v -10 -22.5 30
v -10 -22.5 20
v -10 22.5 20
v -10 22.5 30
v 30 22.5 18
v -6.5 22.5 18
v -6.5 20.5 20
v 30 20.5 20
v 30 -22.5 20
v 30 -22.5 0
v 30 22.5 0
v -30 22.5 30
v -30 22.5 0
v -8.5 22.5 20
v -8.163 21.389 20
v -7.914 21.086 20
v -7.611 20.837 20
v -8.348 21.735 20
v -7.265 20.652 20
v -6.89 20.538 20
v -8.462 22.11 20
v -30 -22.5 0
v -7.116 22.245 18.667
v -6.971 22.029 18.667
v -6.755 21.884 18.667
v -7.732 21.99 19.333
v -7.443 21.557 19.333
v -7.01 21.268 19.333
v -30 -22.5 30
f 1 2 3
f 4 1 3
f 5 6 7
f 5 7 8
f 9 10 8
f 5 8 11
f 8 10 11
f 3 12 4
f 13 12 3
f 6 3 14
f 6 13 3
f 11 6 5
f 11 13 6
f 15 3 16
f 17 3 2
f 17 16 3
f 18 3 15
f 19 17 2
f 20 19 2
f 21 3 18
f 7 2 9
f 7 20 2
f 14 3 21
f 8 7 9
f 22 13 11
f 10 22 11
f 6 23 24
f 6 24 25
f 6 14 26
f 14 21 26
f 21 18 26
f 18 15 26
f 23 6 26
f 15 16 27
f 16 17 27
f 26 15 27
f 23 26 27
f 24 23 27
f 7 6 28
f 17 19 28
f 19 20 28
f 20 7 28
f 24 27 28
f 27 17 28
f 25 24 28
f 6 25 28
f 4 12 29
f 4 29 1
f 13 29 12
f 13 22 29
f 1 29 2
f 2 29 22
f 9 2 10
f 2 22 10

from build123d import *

# Parameters (mm, degrees)
SKETCH1_W               = 60
SKETCH1_H               = 45
BOSS_EXTRUDE1_DEPTH     = 20
SKETCH2_W               = 20
SKETCH2_H               = 45
BOSS_EXTRUDE2_DEPTH     = 10
MFGCHAMFER1_START       = 28.637824638
MFGCHAMFER1_2_OUTLINE_W = 36.5
MFGCHAMFER1_2_OUTLINE_H = 2.828427124
MFGCHAMFER1_2_DEPTH     = 2.362175362


with BuildPart() as part:
    # Sketch1 → Boss-Extrude1 (new body)
    with BuildSketch(Plane.XY):
        Rectangle(SKETCH1_W, SKETCH1_H)
    extrude(amount=BOSS_EXTRUDE1_DEPTH)

    # Sketch2 → Boss-Extrude2 (add)
    with BuildSketch(Plane.XY.offset(20)):
        with Locations((-20, 0)):
            Rectangle(SKETCH2_W, SKETCH2_H)
    extrude(amount=BOSS_EXTRUDE2_DEPTH)

    # MfgChamfer1: read off the stored shape, not the designer's step
    # MfgChamfer1 outline → MfgChamfer1 (revolve, cut)
    with BuildSketch(Plane(origin=(-6.5, 22.5, 0), x_dir=(1, 0, 0), z_dir=(0, -1, 0))):
        Polygon((0, 20), (0, 18), (2, 20), align=None)
    revolve(axis=Axis((-6.5, 22.5, 0), (0, 0, 1)), mode=Mode.SUBTRACT)

    # MfgChamfer1 2 outline → MfgChamfer1 2 (cut)
    with BuildSketch(Plane(origin=(0, 0, 0), x_dir=(1, 0, 0), z_dir=(0, 0.707106781186547, 0.707106781186548)).offset(MFGCHAMFER1_START)):
        with Locations((11.75, 1.767766953)):
            Rectangle(MFGCHAMFER1_2_OUTLINE_W, MFGCHAMFER1_2_OUTLINE_H)
    extrude(amount=MFGCHAMFER1_2_DEPTH, mode=Mode.SUBTRACT)


solid = part.part
